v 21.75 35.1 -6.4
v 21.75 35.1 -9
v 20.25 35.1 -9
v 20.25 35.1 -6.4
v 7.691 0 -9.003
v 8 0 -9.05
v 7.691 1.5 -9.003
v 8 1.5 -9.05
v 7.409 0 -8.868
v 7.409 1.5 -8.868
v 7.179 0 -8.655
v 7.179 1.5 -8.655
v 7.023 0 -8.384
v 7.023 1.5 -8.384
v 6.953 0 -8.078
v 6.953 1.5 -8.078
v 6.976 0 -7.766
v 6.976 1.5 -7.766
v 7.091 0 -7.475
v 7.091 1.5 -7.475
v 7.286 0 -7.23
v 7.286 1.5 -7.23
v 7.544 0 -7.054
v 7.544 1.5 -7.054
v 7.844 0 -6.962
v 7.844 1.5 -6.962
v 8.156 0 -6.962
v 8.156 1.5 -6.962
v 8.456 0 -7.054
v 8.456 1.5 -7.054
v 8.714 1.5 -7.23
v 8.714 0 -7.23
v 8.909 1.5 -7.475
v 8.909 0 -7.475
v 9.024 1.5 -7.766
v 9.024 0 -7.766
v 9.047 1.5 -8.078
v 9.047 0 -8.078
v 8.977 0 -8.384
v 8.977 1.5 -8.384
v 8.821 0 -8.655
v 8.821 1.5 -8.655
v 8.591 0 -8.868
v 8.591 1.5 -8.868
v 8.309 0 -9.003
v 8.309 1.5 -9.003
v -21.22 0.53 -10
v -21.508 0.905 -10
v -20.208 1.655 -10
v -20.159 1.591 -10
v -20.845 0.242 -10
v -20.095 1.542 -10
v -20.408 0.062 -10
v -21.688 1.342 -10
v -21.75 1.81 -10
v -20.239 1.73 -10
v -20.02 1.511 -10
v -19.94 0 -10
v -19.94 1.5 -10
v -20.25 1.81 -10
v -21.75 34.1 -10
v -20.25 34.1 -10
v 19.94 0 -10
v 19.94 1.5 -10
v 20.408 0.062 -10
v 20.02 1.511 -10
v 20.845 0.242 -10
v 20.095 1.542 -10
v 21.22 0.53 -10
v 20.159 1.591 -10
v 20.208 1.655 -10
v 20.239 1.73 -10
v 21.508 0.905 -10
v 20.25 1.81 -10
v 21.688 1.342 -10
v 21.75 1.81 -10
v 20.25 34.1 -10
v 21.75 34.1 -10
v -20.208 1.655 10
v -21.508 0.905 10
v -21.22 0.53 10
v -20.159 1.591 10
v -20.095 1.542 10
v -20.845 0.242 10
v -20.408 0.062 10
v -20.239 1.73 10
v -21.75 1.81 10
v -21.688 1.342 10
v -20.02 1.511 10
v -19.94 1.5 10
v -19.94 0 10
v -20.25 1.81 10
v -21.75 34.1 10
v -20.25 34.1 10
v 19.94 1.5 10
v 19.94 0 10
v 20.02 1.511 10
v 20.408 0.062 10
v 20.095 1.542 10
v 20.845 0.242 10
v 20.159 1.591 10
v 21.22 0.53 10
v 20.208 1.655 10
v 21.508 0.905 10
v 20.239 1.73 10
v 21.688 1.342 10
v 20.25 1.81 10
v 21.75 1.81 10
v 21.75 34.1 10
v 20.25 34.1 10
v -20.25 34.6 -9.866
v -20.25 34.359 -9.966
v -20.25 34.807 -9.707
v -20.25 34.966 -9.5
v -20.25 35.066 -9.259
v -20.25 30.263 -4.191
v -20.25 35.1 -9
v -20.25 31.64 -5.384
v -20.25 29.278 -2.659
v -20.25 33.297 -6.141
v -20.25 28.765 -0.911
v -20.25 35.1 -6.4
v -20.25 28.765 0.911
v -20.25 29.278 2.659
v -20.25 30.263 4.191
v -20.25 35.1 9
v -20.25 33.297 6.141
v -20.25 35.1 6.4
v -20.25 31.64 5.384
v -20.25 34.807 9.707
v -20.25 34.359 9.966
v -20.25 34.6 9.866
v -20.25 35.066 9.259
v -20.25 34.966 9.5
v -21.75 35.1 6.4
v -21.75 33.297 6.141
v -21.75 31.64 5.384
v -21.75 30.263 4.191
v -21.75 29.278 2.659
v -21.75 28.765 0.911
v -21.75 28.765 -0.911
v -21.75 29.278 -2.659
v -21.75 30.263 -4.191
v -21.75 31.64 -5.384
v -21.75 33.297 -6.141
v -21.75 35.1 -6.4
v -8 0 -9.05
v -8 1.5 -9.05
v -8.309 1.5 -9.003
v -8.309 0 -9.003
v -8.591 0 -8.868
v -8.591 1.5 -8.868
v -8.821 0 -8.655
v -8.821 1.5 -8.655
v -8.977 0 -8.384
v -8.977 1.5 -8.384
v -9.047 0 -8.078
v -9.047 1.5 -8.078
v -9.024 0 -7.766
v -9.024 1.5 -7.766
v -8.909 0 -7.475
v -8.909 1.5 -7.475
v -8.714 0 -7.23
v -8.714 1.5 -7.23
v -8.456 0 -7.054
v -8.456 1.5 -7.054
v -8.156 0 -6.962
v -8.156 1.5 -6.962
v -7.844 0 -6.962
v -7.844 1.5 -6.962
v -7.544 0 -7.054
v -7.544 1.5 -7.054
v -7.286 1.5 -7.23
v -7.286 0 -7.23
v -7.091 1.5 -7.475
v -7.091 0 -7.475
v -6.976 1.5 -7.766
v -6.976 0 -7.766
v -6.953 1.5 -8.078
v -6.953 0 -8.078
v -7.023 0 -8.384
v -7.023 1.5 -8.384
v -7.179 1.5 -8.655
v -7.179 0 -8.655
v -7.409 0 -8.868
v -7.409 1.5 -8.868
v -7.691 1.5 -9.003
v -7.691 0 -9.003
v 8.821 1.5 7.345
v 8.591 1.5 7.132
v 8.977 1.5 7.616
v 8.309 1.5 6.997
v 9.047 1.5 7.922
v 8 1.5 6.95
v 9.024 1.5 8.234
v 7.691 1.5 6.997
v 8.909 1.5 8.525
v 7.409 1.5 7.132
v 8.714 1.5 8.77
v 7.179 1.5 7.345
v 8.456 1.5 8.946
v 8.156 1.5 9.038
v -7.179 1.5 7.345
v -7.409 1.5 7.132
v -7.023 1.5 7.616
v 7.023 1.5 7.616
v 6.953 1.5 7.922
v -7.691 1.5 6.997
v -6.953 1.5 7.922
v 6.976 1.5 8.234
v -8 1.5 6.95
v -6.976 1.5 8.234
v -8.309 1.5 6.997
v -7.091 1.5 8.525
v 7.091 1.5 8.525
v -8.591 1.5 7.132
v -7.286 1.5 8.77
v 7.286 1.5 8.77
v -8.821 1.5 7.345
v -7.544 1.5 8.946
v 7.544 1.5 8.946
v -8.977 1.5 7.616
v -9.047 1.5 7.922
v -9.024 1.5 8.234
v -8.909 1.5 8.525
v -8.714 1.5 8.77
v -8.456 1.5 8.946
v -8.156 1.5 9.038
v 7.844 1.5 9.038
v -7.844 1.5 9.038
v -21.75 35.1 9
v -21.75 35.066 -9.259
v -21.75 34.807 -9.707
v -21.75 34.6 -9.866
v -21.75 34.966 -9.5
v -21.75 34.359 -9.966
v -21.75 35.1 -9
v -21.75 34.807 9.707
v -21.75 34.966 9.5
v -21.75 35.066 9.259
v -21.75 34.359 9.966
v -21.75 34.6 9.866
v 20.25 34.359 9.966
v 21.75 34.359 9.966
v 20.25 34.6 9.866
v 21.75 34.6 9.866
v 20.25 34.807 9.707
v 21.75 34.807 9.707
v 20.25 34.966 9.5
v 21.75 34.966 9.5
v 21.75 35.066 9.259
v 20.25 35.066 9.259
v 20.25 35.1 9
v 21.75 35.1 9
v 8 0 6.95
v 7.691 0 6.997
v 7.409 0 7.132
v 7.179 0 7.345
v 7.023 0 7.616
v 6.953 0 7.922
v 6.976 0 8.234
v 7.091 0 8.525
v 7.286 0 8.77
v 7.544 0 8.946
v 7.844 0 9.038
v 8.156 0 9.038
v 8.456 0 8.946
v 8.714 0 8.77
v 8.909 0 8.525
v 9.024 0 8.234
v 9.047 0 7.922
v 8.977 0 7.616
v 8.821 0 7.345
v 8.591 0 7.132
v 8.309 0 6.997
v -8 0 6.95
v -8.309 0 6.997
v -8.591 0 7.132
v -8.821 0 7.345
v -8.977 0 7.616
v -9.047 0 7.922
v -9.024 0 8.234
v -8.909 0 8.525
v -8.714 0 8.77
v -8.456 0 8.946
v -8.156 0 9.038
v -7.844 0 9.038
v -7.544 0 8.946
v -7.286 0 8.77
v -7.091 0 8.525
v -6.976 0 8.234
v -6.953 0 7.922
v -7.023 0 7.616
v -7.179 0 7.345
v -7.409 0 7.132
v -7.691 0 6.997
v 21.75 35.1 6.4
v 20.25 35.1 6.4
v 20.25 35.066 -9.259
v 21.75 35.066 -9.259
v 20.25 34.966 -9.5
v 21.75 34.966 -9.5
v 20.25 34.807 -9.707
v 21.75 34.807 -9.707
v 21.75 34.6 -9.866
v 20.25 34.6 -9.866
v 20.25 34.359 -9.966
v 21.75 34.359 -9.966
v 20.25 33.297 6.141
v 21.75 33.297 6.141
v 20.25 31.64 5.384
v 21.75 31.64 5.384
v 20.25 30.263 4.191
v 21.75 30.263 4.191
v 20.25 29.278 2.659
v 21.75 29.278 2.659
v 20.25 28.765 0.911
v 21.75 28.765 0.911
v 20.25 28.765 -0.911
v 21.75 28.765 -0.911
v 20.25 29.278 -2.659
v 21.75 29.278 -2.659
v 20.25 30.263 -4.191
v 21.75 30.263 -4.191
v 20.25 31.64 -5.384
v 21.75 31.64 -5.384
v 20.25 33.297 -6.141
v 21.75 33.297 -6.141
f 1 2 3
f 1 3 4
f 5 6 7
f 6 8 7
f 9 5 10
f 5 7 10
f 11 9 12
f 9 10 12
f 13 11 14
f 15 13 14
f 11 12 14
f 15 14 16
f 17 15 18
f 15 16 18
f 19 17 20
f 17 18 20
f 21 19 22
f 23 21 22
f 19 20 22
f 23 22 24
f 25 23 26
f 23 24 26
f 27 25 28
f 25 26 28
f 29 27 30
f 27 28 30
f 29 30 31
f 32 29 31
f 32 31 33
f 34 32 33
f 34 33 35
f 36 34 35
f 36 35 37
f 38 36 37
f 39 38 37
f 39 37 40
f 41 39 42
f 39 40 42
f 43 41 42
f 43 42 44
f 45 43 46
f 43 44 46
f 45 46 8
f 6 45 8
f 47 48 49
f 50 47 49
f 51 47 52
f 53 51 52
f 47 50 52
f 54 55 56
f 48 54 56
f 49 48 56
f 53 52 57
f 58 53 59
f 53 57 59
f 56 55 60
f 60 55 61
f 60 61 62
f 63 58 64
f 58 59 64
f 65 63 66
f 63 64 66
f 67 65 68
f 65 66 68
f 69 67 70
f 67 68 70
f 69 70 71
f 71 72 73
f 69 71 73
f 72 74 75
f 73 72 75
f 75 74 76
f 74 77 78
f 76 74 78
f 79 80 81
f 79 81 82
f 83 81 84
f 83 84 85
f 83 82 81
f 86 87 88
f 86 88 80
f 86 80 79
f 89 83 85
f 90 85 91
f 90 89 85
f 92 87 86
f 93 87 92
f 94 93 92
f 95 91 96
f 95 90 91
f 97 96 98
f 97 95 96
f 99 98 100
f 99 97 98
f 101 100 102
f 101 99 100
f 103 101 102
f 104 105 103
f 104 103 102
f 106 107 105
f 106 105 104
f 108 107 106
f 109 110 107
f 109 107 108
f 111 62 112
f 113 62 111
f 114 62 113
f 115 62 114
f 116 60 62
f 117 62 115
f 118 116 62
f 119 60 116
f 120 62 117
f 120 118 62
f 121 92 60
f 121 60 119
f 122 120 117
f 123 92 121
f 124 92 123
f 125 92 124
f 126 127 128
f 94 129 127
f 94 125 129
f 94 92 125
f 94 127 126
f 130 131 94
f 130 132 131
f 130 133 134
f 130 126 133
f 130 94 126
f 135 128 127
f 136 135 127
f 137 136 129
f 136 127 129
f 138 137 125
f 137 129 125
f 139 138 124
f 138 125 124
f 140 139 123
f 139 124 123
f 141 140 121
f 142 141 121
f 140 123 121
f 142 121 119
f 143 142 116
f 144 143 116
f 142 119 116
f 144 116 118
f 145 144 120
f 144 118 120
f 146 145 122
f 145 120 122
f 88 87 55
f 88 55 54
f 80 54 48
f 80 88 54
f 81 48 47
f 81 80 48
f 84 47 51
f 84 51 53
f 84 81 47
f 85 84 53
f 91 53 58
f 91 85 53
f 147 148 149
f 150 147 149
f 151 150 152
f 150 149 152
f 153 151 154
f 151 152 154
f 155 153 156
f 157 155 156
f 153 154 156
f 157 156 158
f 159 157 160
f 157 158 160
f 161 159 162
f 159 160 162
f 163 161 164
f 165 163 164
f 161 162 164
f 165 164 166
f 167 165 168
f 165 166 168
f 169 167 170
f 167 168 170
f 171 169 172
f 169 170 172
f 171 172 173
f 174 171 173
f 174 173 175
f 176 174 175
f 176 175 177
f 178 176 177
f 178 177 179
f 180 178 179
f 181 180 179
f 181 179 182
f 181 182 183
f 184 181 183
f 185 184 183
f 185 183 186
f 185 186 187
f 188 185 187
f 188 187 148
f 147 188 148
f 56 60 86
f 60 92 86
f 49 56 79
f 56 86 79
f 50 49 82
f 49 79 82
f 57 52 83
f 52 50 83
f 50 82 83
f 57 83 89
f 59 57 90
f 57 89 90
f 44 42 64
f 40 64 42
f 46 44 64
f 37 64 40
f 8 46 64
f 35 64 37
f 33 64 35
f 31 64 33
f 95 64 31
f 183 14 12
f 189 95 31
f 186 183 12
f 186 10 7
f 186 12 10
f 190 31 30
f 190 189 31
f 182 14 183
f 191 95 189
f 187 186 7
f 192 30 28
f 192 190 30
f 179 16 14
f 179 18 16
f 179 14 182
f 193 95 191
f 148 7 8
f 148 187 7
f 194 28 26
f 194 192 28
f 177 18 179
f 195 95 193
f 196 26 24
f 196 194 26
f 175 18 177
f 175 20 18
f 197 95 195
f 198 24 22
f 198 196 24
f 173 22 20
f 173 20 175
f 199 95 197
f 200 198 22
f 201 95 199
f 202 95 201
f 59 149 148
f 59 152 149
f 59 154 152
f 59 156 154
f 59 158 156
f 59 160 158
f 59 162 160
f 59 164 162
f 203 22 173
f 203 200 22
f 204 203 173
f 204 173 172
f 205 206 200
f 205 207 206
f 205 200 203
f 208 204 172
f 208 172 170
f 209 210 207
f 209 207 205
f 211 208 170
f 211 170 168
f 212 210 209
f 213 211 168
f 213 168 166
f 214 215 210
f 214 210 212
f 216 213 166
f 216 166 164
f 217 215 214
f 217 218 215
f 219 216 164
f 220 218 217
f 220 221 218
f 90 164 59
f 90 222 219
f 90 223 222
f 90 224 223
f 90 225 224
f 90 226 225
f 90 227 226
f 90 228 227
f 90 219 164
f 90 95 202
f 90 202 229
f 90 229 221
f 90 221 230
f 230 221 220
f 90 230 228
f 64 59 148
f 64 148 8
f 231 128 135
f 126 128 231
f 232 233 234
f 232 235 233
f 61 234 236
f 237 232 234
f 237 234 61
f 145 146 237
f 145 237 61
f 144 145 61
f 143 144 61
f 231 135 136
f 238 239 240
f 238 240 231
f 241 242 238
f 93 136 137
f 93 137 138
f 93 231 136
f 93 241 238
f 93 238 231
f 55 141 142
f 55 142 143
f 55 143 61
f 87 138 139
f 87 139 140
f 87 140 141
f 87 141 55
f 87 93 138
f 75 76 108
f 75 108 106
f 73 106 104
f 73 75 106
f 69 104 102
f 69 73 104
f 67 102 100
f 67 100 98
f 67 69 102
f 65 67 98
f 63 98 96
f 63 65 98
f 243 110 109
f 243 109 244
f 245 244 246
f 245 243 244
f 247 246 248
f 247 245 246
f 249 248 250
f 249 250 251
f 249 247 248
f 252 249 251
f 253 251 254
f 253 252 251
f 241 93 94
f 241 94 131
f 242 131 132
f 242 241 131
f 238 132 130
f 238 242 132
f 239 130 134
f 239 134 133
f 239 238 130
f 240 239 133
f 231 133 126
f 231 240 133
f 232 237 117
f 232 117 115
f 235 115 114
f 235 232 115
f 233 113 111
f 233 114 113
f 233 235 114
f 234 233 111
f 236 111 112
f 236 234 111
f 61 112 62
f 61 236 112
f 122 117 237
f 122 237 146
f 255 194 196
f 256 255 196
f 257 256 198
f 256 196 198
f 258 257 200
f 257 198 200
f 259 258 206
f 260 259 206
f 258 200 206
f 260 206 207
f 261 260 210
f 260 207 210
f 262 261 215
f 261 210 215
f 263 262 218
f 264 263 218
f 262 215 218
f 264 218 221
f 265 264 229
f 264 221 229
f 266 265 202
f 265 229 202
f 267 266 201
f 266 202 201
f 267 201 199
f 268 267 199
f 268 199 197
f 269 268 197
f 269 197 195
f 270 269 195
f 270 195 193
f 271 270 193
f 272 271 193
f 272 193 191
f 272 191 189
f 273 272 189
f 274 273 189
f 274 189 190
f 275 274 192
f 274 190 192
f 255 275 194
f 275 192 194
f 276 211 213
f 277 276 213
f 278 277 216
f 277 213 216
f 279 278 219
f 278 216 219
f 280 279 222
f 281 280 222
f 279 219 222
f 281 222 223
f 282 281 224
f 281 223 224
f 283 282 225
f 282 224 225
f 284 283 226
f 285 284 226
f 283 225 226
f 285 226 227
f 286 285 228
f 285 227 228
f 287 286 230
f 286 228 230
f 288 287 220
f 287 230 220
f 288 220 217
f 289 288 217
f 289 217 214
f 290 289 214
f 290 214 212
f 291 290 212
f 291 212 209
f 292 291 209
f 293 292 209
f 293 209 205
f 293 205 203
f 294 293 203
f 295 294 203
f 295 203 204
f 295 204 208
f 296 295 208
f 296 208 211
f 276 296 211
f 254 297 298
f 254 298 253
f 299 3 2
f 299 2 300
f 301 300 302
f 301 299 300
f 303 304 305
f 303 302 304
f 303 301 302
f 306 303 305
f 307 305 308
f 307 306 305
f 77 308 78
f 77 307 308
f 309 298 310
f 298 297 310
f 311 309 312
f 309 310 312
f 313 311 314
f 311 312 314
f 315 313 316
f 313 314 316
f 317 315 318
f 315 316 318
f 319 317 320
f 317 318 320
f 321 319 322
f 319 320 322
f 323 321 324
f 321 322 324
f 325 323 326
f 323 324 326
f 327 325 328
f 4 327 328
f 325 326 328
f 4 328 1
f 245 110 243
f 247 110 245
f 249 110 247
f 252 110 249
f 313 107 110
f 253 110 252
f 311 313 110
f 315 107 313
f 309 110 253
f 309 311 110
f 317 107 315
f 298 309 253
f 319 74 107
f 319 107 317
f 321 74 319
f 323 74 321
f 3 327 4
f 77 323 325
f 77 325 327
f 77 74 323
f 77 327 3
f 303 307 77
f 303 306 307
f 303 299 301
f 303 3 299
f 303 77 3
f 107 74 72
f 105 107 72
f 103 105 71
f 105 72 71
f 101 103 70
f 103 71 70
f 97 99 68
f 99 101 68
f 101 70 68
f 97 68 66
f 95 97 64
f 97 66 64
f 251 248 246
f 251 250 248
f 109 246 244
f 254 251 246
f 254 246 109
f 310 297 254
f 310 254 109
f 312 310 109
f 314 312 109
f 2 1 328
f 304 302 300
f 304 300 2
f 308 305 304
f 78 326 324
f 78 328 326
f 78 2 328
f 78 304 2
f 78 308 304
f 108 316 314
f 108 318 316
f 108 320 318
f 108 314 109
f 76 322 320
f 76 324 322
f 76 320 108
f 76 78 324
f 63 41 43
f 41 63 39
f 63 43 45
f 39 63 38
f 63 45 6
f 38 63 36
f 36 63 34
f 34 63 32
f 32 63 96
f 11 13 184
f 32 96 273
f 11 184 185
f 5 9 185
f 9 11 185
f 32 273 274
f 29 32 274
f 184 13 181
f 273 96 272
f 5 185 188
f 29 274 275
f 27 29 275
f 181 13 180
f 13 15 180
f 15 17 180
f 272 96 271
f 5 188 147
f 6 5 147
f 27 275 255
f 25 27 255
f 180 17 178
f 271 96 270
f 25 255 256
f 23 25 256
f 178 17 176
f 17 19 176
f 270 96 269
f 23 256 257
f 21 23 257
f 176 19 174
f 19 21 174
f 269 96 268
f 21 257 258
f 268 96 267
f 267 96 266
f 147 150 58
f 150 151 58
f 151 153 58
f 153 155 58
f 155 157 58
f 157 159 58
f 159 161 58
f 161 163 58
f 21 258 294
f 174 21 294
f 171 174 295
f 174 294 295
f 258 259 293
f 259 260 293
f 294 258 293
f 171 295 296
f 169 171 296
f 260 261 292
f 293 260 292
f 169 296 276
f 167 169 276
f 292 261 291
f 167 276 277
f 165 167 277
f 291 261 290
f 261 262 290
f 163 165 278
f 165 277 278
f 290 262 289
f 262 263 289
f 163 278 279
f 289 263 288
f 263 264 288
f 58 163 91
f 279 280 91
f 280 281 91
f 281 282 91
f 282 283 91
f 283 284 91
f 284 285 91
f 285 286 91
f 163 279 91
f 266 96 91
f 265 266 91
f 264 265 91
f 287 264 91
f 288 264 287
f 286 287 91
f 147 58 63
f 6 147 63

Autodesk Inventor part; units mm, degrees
ref_plane "YZ Plane" through (0, 0, 0) normal (1, 0, 0) x (0, 1, 0)
ref_plane "XZ Plane" through (0, 0, 0) normal (0, 1, 0) x (-1, 0, 0)
ref_plane "XY Plane" through (0, 0, 0) normal (0, 0, 1) x (1, 0, 0)
sketch "Sketch1" plane through (0, 0, 0) normal (0, 1, 0) x (-1, 0, 0)
  line L0 (20.25, -10) -> (-20.25, -10)
  line L1 (-20.25, -10) -> (-20.25, 10)
  line L2 (-20.25, 10) -> (20.25, 10)
  line L3 (20.25, 10) -> (20.25, -10)
  point P0 (0, 0)
  dimension "d0" = 40.5
  dimension "d1" = 20
  dimension "d2" = 10
  dimension "d3" = 20.25
extrude "Plate1" add sketch "Sketch1" along normal blind 1.5
sketch "Sketch2" plane through (21.75, 0, -10) normal (-1, 0, 0) x (0, -1, 0)
  line L0 (0, 20) -> (0, 0)
  line L1 (0, 0) -> (-45, 0)
  line L2 (-45, 0) -> (-45, 20)
  line L3 (-45, 20) -> (0, 20)
edge flange "Flange1" height 45 angle 90 thickness 1.5 bend radius 0.31 thickness toward (-1, 0, 0) relief tear relief width 1.5 relief depth 0.75 edges at (20.25, 1.5, 0) wall of the first edge with corners at (21.75, 0, 10) (21.75, 0, -10) (21.75, 45, -10) (21.75, 45, 10)
bend "Bend1"
corner "Corner1"
sketch "Sketch3" plane through (-21.75, 0, 10) normal (1, 0, 0) x (0, 1, 0)
  line L0 (0, -20) -> (0, 0)
  line L1 (0, 0) -> (45, 0)
  line L2 (45, 0) -> (45, -20)
  line L3 (45, -20) -> (0, -20)
edge flange "Flange2" height 45 angle 90 thickness 1.5 bend radius 0.31 thickness toward (1, 0, 0) relief tear relief width 1.5 relief depth 0.75 edges at (-20.25, 1.5, 0) wall of the first edge with corners at (-21.75, 0, -10) (-21.75, 0, 10) (-21.75, 45, 10) (-21.75, 45, -10)
bend "Bend2"
corner "Corner2"
sketch "Sketch4" plane through (21.75, 45, 10) normal (1, 0, 0) x (0, 0, -1)
  circle A0 centre (10, -9.9) radius 6.4
  line L0 (0, 0) -> (20, 0) projected
  line L1 (20, 0) -> (20, -43.19) projected
  point P0 (10, -45)
  dimension "d25" = 9.9
  dimension "d26" = 12.8
  dimension "d27" = 10
extrude "Extrusion1" cut sketch "Sketch4" against normal blind 50
sketch "Sketch5" plane through (21.75, 45, 10) normal (1, 0, 0) x (0, 0, -1)
  circle A0 centre (10, -9.9) radius 6.4 projected
  line L0 (0, 0) -> (20, 0) projected
  line L1 (-4, 0) -> (24, 0)
  line L2 (24, 0) -> (24, -9.9)
  line L3 (24, -9.9) -> (-4, -9.9)
  line L4 (-4, -9.9) -> (-4, 0)
  line L5 (0, -43.19) -> (0, 0) projected
  point P0 (10, -45)
  dimension "d30" = 9.9
  dimension "d31" = 28
  dimension "d32" = 4
extrude "Extrusion2" cut sketch "Sketch5" against normal blind 50 contours L3 A0 | A0 L3 L5 L0 L1 L2 | L3 L4 L1 L5 picked at (9.2435, -7.9053)
fillet "Fillet1" radius 1 4 edges at (-21, 35.1, 10) (-21, 35.1, -10) (21, 35.1, -10) (21, 35.1, 10)
sketch "Sketch8" plane through (0, 0, 0) normal (0, -1, 0) x (1, 0, 0)
  circle A0 centre (8, -8) radius 1.05 projected
  circle A1 centre (-8, -8) radius 1.05 projected
  circle A2 centre (8, 8) radius 1.05 projected
  circle A3 centre (-8, 8) radius 1.05 projected
  point P0 (0, 0)
hole "Hole3" at (8, 0, -8) at (-8, 0, -8) at (-8, 0, 8) at (8, 0, 8) direction (0, 1, 0) diameter 2.1 depth 1.5
equation "\"d55\" = Thickness"
equation "\"d4\" = Thickness"
equation "\"d5\" = BendReliefWidth"
equation "\"d6\" = BendReliefDepth"
equation "\"d7\" = MinimumRemnant"
equation "\"d8\" = TransitionRadius"
equation "\"d11\" = BendRadius"
equation "\"d12\" = CornerReliefSize"
equation "\"d13\" = GapSize"
equation "\"d14\" = JacobiRadiusSize"
equation "\"d15\" = BendReliefWidth"
equation "\"d16\" = BendReliefDepth"
equation "\"d17\" = MinimumRemnant"
equation "\"d18\" = TransitionRadius"
equation "\"d21\" = BendRadius"
equation "\"d22\" = CornerReliefSize"
equation "\"d23\" = GapSize"
equation "\"d24\" = JacobiRadiusSize"
equation "\"BendReliefWidth\" = Thickness"
equation "\"BendReliefDepth\" = 0.5 * Thickness"
equation "\"CornerReliefSize\" = 4 * Thickness"
equation "\"MinimumRemnant\" = 2 * Thickness"
equation "\"TransitionRadius\" = BendRadius"
equation "\"JacobiRadiusSize\" = BendRadius"
equation "\"GapSize\" = Thickness"
equation "\"Thickness\" = 1.5"
equation "\"BendRadius\" = 0.31"
properties part number "axis_10_top_frame" material "Aluminum 6061-AHC"
